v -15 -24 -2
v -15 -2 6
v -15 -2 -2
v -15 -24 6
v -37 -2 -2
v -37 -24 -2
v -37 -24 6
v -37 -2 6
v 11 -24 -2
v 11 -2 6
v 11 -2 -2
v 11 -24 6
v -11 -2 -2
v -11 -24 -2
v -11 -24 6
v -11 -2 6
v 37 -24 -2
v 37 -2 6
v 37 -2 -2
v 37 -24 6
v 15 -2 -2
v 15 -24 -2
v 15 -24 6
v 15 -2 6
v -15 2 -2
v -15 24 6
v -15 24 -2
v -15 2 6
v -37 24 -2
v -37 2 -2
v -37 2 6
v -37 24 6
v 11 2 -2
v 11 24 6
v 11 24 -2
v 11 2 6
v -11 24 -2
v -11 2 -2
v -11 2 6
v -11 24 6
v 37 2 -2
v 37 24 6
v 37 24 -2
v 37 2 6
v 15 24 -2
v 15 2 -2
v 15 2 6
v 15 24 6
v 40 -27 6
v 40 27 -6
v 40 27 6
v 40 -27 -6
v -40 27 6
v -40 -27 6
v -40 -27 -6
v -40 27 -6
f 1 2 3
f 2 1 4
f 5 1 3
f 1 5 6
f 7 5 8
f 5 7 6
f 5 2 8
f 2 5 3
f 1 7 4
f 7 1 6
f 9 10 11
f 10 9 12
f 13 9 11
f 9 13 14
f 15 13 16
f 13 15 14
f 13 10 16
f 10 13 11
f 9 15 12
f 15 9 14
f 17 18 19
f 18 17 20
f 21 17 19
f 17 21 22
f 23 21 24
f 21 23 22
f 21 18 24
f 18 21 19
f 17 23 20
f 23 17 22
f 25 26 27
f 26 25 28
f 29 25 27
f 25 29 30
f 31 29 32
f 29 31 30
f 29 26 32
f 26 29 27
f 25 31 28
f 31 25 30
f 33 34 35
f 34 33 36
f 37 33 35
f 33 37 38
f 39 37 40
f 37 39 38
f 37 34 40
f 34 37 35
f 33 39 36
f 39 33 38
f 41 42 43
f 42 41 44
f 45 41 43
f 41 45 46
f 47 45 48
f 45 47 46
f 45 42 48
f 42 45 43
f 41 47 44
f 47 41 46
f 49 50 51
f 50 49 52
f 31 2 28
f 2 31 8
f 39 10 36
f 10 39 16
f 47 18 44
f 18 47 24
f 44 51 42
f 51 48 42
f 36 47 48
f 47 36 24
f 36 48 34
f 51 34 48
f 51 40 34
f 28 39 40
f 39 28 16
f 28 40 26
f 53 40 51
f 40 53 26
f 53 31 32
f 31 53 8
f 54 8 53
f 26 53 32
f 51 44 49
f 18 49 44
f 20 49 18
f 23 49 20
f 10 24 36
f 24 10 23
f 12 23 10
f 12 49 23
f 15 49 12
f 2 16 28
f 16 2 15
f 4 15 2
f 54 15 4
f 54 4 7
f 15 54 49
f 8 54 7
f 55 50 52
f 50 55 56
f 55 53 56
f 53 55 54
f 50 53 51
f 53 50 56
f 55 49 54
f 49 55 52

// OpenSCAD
$fn = 32;

// ----------------------------------------------------------------------
// Pocket plate 80 x 54 x 12
// 2 x 3 pockets 22 mm square, 8 mm deep
// ----------------------------------------------------------------------

// --- parameters (mm) ---
thickness = 12;  // plate thickness
floor_t = 4;     // material left under each pocket
pocket = 22;     // pocket side length
pitch_x = 26;    // pocket pitch along X
pitch_y = 26;    // pocket pitch along Y
cols = 3;        // pockets per row
rows = 2;        // rows of pockets

// --- derived feature positions (mm) ---
depth = thickness - floor_t;        // = 8   pocket depth, down to the floor
span_x = (cols - 1) * pitch_x;      // = 52   distance between outer pockets
span_y = (rows - 1) * pitch_y;      // = 26   distance between outer pocket rows
origin_x = -span_x / 2;             // = -26   X of the first pocket
origin_y = -span_y / 2;             // = -13   Y of the first pocket
plate = [span_x + pocket + 6, span_y + pocket + 6, thickness];  // = [80, 54, 12]   overall size: pockets plus 3 mm of wall on each side
feature_centers = [
  [origin_x + 0 * pitch_x, origin_y + 0 * pitch_y],
  [origin_x + 1 * pitch_x, origin_y + 0 * pitch_y],
  [origin_x + 2 * pitch_x, origin_y + 0 * pitch_y],
  [origin_x + 0 * pitch_x, origin_y + 1 * pitch_y],
  [origin_x + 1 * pitch_x, origin_y + 1 * pitch_y],
  [origin_x + 2 * pitch_x, origin_y + 1 * pitch_y]
];   // pocket centres, used verbatim by the cutter loop

// plate outline, then one pocket per centre in feature_centers
difference() {
  cube(plate, center = true);
  for (centre = feature_centers)
    translate([centre[0] - pocket / 2, centre[1] - pocket / 2, plate[2] / 2 - depth])
      cube([pocket, pocket, depth + 1]);  // centred on the declared pocket centre
}
